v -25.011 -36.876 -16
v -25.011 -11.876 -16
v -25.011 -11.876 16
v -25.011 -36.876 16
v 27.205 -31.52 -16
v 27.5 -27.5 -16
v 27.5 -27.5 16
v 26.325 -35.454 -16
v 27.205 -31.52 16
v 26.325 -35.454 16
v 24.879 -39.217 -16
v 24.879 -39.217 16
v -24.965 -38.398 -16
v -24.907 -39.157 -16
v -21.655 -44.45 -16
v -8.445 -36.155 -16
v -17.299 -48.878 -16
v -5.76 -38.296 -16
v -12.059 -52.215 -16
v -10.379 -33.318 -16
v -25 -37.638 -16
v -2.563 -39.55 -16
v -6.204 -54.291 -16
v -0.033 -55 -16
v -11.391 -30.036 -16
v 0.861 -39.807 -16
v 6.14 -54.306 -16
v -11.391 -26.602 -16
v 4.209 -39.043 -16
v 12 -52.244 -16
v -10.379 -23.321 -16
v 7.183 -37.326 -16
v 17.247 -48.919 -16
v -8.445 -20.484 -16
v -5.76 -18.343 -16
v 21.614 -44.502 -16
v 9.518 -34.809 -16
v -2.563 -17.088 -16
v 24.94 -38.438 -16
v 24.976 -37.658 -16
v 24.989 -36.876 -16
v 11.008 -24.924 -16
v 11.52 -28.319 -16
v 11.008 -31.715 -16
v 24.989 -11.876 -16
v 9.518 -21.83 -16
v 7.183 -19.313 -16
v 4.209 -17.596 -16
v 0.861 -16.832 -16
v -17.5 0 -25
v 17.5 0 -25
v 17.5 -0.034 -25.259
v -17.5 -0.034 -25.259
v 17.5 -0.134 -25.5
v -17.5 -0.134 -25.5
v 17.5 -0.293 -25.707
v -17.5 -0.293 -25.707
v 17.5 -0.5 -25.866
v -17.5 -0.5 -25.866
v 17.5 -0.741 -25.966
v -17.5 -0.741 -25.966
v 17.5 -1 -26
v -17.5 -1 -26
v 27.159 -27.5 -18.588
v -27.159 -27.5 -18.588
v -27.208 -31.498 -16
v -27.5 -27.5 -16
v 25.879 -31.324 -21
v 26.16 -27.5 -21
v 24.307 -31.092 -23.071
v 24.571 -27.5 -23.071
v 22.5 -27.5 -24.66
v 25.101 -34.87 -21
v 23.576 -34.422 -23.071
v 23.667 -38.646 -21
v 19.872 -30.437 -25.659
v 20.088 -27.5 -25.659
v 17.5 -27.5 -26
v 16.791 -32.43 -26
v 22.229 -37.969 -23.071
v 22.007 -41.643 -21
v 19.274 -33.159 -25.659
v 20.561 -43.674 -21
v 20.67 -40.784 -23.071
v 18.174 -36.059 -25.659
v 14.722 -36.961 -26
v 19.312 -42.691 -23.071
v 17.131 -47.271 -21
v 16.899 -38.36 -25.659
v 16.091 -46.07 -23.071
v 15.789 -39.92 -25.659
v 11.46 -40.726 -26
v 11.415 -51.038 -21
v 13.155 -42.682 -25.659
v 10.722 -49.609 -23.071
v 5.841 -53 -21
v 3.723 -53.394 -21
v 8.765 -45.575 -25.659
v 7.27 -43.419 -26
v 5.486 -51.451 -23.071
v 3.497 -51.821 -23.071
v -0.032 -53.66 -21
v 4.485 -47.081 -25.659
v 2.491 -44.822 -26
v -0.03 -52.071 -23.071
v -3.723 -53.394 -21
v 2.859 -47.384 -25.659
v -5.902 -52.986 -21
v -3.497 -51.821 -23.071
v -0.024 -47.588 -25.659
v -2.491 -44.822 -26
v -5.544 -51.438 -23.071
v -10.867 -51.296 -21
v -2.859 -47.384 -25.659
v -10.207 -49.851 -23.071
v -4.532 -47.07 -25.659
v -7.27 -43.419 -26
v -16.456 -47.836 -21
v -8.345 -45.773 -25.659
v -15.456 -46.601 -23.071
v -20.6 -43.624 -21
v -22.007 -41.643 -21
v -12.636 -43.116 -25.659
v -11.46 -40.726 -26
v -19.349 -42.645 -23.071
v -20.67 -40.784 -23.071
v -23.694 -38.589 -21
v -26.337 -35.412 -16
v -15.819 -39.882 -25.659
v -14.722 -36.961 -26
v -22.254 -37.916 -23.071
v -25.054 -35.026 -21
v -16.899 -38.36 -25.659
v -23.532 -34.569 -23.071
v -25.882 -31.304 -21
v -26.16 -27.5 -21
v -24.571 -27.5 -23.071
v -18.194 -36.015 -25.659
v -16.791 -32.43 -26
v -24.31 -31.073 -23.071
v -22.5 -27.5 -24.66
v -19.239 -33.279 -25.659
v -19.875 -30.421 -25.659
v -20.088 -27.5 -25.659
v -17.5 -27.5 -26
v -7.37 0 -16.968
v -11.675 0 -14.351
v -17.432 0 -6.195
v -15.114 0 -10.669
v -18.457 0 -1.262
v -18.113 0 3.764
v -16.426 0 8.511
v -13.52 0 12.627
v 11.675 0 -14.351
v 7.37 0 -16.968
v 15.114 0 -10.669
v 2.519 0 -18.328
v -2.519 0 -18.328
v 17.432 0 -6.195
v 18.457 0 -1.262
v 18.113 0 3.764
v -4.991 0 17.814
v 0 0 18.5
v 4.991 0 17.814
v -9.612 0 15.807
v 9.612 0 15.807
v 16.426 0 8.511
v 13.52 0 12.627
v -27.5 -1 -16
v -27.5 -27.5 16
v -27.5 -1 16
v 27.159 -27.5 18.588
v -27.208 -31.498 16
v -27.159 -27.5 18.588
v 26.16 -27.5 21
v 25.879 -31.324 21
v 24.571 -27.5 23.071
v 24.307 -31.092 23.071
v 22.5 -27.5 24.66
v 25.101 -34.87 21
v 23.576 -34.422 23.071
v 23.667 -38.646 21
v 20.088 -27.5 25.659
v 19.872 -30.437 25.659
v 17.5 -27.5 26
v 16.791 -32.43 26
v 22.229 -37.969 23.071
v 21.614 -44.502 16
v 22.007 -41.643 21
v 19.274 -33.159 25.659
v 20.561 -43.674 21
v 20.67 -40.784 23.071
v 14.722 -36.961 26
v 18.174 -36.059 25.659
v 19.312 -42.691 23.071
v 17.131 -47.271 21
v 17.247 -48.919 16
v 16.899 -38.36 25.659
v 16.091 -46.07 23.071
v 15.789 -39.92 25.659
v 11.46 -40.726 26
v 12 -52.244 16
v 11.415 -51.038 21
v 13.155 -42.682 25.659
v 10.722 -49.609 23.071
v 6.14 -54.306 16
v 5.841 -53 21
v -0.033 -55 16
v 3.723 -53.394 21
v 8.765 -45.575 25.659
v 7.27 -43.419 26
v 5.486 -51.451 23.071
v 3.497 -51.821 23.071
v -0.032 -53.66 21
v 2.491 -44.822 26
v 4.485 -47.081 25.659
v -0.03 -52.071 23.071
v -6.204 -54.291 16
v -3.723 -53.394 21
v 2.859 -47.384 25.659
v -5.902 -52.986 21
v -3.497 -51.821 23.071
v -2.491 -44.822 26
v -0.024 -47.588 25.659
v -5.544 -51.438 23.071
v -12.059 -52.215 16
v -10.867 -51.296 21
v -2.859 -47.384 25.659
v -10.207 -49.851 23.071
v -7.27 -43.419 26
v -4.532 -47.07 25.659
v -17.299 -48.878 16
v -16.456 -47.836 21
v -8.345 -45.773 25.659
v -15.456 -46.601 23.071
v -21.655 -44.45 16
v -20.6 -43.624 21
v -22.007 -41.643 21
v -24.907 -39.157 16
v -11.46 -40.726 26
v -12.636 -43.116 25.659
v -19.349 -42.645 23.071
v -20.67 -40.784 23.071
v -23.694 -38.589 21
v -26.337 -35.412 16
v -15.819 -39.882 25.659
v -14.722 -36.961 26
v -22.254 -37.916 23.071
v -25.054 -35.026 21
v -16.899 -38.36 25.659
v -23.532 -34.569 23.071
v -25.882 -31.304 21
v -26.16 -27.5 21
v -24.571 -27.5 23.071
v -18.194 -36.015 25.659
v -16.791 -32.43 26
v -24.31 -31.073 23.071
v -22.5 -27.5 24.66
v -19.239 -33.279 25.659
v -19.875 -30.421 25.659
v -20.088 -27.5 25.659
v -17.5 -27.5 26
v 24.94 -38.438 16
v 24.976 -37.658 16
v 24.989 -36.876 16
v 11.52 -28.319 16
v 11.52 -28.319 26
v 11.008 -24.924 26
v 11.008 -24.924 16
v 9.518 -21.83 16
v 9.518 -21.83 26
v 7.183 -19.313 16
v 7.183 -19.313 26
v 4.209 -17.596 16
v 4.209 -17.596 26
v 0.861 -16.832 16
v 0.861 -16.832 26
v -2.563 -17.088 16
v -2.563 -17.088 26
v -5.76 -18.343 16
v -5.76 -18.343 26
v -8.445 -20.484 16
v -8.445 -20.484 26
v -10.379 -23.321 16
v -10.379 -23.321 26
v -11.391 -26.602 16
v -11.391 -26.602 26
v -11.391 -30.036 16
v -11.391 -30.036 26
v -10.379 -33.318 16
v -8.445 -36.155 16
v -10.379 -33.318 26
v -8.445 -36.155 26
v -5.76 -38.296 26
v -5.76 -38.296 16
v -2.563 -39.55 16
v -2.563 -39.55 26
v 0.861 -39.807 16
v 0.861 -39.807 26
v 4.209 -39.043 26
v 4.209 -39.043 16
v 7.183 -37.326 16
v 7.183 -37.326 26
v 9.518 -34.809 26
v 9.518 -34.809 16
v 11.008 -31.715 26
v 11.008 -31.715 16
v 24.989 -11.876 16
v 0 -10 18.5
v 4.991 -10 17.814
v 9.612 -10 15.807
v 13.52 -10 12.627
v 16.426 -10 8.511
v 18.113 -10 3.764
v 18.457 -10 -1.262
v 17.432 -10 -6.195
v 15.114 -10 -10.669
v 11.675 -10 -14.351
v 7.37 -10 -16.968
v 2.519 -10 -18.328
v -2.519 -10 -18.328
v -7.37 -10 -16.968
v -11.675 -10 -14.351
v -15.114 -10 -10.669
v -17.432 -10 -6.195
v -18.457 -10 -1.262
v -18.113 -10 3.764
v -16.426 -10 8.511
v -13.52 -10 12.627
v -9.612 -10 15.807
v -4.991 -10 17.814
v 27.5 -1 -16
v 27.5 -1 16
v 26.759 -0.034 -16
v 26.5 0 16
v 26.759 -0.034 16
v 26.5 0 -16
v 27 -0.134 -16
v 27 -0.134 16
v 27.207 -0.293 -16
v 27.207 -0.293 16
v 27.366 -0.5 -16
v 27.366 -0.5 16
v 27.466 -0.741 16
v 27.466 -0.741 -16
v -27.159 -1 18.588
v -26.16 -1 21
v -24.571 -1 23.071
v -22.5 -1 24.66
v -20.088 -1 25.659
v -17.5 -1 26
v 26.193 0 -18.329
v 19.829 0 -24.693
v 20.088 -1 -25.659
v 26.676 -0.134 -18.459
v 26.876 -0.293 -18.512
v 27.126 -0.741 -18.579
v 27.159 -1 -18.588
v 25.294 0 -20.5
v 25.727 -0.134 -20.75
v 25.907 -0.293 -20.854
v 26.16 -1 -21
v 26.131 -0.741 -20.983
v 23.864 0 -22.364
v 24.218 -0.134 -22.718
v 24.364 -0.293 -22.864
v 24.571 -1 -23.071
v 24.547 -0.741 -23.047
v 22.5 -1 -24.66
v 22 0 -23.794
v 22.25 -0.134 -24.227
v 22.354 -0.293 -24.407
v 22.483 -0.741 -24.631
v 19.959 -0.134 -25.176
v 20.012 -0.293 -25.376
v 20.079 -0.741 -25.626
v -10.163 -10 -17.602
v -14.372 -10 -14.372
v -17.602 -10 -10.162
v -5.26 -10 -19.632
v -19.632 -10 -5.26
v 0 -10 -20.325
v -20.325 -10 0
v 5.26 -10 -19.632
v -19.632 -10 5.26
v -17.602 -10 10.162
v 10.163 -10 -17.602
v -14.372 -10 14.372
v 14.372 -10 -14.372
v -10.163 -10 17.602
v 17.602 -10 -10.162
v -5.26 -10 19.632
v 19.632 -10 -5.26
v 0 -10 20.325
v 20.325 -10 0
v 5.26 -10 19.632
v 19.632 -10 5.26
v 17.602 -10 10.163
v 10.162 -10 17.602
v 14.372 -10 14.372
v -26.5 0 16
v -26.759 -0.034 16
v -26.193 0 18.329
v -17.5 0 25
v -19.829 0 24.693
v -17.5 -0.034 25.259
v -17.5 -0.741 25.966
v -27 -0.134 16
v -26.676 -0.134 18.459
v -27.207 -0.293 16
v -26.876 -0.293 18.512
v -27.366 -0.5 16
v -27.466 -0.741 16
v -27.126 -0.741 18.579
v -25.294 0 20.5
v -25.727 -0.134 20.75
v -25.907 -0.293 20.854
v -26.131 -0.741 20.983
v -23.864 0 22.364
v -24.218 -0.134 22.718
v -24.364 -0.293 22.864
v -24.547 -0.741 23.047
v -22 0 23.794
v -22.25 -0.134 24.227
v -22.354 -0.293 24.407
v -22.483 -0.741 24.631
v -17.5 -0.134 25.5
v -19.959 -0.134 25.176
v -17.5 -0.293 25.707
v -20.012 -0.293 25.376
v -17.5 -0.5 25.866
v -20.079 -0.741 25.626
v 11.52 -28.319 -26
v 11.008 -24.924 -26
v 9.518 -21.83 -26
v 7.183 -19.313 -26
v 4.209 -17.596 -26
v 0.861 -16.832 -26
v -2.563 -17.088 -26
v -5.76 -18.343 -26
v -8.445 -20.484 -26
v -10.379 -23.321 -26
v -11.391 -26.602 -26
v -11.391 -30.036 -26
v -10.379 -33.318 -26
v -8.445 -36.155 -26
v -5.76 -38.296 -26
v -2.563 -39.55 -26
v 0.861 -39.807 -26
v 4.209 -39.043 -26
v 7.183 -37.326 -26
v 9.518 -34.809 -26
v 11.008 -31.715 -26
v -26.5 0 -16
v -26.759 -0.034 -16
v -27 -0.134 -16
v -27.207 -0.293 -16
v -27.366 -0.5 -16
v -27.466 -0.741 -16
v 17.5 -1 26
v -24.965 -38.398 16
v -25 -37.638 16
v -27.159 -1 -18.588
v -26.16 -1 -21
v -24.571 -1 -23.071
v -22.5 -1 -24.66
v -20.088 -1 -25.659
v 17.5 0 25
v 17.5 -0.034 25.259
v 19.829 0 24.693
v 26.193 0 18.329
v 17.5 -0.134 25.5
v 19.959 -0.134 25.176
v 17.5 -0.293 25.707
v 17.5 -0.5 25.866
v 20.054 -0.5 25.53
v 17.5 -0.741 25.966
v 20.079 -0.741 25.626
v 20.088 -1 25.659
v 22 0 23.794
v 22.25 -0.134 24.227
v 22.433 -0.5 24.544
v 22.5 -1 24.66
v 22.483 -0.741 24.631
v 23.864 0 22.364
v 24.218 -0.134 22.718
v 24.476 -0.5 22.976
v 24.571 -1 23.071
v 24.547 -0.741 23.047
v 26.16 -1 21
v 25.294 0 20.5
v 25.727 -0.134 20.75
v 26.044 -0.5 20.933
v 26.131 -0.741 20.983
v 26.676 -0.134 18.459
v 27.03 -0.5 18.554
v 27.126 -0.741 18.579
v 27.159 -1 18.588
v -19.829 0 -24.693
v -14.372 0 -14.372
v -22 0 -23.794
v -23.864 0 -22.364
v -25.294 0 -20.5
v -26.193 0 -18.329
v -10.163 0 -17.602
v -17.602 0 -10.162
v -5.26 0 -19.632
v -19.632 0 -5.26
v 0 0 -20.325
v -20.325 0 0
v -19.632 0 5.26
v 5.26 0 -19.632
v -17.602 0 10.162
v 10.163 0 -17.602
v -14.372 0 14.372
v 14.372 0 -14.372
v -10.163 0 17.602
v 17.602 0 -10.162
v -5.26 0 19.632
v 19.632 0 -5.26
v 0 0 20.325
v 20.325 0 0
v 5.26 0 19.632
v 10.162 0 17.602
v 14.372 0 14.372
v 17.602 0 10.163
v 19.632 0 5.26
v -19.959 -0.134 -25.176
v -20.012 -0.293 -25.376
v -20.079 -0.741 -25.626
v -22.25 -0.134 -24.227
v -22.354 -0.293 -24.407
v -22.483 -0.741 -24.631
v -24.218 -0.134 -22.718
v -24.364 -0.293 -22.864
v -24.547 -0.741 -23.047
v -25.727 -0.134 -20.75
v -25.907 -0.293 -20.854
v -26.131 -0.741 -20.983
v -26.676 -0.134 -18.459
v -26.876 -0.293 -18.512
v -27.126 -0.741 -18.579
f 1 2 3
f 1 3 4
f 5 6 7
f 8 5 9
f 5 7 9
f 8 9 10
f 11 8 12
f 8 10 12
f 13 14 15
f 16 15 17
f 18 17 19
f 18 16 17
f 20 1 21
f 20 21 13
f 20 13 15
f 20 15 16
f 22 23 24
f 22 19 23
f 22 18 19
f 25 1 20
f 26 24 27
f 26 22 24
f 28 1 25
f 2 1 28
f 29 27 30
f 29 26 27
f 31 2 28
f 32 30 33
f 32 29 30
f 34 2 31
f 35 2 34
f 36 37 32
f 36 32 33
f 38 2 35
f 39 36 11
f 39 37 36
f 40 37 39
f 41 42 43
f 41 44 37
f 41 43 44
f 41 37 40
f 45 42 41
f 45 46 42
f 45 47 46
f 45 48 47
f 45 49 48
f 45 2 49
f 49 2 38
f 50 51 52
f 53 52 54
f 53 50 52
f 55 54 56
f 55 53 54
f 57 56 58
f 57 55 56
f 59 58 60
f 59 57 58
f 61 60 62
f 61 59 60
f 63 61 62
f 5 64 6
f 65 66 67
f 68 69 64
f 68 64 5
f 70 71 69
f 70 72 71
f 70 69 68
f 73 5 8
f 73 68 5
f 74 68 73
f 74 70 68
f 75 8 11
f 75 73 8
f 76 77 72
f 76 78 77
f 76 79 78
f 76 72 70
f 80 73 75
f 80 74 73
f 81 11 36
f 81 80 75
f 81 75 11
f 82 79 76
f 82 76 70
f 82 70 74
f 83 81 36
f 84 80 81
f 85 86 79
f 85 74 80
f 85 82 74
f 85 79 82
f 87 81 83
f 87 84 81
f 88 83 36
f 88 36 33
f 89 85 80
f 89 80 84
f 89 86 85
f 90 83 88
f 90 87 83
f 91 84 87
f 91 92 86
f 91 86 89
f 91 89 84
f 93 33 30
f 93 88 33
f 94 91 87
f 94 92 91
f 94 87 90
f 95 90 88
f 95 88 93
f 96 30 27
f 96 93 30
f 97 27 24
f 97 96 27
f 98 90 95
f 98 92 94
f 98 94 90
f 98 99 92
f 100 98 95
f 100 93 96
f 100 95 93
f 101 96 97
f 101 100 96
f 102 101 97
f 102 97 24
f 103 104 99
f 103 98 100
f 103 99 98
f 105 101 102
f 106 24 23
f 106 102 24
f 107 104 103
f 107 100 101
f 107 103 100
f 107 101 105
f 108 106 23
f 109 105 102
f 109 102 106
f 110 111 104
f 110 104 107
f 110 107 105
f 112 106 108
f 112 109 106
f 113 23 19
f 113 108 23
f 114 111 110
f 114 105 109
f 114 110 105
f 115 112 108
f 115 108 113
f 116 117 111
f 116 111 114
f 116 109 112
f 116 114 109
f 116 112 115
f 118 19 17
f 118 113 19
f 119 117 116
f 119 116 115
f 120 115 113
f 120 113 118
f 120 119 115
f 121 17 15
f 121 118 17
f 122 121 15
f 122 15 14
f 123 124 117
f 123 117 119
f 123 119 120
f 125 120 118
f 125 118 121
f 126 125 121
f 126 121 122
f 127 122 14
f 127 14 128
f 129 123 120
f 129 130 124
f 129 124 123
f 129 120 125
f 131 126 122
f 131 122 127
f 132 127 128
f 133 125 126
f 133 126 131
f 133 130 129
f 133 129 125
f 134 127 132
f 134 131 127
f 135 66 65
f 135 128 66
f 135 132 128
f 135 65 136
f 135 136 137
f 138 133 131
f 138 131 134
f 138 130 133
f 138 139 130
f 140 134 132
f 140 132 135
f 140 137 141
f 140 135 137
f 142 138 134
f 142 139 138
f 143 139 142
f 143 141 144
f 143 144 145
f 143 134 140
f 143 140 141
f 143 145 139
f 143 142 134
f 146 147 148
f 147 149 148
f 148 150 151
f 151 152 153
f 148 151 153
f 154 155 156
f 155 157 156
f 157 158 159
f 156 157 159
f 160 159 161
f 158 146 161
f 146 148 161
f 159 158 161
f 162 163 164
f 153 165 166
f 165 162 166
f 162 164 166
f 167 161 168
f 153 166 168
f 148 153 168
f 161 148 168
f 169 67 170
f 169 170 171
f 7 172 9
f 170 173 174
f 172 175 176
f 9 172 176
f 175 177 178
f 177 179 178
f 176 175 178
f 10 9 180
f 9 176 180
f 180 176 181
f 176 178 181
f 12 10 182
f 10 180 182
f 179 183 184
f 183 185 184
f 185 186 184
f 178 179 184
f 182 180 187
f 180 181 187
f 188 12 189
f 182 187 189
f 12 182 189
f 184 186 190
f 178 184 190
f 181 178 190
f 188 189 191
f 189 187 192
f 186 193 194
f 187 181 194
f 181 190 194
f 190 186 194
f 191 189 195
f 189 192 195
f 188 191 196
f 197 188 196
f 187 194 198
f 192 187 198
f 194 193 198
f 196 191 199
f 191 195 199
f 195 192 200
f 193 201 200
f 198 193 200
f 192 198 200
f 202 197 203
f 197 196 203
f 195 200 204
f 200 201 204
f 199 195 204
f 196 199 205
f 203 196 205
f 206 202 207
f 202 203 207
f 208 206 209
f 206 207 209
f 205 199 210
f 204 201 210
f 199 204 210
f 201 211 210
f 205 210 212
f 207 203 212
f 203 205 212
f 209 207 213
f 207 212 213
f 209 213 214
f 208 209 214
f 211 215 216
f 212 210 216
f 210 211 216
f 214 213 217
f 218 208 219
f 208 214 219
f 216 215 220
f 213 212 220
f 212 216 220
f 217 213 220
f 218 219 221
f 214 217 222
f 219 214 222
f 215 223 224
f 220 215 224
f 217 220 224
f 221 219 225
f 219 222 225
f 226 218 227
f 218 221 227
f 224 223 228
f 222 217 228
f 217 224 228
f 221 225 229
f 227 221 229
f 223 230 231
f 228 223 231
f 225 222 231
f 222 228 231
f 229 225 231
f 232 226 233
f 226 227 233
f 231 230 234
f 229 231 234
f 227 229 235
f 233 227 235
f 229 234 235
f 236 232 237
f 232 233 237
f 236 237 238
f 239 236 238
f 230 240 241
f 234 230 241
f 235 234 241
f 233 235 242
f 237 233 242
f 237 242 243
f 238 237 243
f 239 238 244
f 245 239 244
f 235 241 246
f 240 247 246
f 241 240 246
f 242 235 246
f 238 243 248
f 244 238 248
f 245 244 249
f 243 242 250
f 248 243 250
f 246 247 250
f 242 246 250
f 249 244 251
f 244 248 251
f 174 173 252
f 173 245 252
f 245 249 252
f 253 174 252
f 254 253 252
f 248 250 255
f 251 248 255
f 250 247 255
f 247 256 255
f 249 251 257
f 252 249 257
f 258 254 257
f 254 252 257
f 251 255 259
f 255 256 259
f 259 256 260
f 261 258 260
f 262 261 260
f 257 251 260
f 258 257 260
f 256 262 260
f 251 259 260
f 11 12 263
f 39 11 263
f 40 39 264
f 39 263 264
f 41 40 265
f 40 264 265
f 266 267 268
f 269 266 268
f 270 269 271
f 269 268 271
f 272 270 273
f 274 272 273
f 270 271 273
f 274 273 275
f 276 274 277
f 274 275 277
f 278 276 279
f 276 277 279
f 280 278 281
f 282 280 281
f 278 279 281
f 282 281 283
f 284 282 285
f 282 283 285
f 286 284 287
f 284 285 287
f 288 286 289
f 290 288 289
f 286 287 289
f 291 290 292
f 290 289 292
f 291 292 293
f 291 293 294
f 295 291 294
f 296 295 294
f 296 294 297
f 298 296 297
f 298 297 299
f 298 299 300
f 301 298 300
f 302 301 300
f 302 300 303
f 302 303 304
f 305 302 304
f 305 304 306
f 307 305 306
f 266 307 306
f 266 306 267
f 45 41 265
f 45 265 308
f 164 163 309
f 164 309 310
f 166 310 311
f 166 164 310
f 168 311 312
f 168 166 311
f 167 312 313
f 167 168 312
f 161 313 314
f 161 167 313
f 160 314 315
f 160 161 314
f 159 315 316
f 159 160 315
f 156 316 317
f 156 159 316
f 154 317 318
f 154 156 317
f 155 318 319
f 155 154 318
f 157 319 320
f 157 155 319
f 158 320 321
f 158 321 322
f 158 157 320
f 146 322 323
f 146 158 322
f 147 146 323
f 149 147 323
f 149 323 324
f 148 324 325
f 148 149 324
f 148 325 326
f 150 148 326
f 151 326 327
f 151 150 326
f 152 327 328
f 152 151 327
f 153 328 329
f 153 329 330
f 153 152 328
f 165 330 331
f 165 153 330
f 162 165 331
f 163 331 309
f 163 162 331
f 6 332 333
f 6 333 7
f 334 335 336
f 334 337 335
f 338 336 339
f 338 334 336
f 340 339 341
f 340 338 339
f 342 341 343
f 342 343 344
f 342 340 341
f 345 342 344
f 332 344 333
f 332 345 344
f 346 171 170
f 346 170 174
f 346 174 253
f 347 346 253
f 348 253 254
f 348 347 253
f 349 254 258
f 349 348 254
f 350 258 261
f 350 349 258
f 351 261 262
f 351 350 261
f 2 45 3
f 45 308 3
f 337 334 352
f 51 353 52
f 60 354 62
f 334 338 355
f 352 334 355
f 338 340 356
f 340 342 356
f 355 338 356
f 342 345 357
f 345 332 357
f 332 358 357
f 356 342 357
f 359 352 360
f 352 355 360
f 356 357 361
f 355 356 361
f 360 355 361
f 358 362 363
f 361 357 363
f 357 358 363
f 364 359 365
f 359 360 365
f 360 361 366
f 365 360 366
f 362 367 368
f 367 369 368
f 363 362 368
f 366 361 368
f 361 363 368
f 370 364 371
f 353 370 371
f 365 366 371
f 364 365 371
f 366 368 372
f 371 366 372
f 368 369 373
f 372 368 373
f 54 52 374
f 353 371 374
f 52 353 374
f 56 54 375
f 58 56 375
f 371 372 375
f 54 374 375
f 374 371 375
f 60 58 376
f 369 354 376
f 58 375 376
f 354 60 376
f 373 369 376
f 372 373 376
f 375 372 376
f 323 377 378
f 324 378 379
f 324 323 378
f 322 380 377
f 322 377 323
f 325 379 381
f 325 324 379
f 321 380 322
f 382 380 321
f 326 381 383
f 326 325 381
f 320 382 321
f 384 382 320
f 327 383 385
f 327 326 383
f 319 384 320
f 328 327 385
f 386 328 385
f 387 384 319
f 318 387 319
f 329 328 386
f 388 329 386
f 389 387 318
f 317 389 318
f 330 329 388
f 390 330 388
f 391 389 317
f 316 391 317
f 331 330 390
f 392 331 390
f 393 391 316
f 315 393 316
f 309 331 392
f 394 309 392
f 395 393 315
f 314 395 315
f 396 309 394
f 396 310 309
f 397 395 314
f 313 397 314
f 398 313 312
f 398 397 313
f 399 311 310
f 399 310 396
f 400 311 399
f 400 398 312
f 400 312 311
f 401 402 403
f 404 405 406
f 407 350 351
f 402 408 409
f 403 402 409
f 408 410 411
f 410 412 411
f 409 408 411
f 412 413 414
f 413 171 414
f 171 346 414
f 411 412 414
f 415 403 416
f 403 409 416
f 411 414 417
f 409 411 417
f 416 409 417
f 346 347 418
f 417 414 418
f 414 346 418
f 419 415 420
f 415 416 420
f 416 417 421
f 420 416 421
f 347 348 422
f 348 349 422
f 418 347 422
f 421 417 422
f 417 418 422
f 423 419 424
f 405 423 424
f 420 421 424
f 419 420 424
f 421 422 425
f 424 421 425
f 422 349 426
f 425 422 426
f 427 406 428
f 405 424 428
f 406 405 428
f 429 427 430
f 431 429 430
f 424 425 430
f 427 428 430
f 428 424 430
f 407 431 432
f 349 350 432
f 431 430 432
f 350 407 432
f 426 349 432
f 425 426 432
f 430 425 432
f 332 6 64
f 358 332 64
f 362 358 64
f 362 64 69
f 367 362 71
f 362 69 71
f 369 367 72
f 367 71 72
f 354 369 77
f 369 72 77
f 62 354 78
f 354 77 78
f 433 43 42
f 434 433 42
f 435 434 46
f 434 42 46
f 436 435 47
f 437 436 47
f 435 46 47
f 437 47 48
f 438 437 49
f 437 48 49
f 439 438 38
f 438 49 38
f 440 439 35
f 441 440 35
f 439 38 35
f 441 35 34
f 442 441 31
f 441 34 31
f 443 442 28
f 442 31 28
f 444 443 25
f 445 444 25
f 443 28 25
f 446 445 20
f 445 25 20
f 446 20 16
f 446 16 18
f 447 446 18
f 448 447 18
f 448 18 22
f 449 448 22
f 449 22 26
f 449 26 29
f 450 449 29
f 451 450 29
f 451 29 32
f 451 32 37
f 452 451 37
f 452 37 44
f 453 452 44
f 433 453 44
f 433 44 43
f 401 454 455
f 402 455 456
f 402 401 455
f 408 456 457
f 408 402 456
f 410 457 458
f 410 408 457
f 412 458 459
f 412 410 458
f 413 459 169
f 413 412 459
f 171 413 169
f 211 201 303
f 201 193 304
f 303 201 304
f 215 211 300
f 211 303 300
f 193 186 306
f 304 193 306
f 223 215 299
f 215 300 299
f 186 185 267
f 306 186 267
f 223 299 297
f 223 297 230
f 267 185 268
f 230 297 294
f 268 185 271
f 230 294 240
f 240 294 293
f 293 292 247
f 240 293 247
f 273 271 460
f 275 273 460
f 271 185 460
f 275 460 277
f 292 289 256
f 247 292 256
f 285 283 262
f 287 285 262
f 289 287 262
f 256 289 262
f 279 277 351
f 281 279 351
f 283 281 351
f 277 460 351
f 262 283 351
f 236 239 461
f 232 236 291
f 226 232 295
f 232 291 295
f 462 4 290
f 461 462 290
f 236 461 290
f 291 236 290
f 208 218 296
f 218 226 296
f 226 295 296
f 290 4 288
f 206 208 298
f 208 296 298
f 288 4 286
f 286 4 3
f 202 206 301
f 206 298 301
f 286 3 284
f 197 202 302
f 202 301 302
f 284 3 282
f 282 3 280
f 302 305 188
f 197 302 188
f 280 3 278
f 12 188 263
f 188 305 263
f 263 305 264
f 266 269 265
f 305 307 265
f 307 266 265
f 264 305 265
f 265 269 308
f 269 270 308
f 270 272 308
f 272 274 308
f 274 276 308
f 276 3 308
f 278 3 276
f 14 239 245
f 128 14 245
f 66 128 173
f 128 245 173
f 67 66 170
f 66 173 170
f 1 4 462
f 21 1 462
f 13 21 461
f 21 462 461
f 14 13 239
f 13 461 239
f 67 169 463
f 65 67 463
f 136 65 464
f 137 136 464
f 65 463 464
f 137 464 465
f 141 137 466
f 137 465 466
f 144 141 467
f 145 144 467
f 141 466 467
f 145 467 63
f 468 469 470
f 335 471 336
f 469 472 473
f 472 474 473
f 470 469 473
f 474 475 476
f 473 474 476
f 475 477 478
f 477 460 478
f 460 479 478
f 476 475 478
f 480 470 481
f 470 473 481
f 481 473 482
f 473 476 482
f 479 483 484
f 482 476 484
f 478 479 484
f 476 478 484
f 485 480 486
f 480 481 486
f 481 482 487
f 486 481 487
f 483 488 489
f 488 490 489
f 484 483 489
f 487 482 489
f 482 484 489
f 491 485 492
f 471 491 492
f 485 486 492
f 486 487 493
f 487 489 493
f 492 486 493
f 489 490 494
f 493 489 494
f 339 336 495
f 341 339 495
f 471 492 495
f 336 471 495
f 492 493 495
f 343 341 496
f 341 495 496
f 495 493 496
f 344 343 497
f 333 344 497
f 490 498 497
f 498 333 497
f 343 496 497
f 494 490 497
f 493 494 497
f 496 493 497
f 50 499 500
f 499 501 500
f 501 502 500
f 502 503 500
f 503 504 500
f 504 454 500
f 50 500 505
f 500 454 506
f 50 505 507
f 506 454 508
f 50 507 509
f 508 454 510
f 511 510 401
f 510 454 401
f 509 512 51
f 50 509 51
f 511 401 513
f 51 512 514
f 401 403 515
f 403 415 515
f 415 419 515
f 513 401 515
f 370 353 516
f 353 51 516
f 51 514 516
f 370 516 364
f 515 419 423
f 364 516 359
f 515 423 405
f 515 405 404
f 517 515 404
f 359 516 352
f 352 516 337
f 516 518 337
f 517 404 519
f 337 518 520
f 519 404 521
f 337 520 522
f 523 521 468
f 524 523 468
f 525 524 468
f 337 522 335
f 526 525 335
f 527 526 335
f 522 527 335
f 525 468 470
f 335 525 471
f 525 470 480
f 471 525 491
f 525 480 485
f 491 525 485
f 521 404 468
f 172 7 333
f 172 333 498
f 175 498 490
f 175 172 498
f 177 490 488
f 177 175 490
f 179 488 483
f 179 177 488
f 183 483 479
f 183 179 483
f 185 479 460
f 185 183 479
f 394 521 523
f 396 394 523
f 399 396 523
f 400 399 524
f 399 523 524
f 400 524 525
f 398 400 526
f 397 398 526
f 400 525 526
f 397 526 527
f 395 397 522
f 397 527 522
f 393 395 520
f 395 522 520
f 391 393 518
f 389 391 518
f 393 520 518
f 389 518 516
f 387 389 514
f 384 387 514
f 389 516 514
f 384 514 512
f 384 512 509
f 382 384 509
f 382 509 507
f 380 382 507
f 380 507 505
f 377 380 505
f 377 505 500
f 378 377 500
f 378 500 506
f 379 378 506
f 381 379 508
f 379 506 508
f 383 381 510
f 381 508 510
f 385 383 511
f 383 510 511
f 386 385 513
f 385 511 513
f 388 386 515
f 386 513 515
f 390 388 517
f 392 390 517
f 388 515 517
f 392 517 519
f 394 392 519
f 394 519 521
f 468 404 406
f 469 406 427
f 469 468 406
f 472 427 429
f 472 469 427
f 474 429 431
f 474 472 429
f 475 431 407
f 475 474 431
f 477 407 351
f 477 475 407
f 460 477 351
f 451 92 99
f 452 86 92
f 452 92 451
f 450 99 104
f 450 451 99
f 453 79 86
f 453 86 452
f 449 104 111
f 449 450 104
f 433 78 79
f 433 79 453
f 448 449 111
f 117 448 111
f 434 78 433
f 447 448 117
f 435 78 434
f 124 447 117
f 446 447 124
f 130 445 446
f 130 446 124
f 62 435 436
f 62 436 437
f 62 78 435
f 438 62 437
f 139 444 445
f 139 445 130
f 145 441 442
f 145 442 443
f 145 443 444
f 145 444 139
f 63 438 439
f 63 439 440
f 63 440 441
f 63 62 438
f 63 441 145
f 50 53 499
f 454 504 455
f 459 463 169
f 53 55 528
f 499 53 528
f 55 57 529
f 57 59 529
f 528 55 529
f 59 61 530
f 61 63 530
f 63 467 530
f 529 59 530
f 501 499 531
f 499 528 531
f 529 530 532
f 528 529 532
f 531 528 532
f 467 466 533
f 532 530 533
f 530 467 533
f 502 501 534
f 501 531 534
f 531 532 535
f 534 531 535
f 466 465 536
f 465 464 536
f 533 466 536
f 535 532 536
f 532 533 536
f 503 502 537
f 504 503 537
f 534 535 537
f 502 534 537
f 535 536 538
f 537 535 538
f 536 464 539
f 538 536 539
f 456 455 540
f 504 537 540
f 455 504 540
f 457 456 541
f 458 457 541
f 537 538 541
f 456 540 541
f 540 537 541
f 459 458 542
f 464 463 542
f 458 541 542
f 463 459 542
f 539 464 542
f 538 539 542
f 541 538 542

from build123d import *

# Parameters (mm, degrees)
BOSS_EXTRUDE1_DEPTH = 26
SKETCH3_R           = 20.325
SKETCH3_R_2         = 18.5
CUT_EXTRUDE1_DEPTH  = 10
FILLET1_R           = 10
FILLET5_R           = 1
CUT_EXTRUDE2_DEPTH  = 16
SKETCH10_R          = 11.52
CUT_EXTRUDE4_DEPTH  = 75


with BuildPart() as part:
    # Sketch2 → Boss-Extrude1 (new, symmetric)
    with BuildSketch(Plane.XY):
        with BuildLine():
            Line((-27.5, -27.5), (-27.5, 0))
            Line((-27.5, 0), (27.5, 0))
            Line((27.5, 0), (27.5, -27.5))
            ThreePointArc((27.5, -27.5), (0, -55), (-27.5, -27.5))
        make_face()
    extrude(amount=BOSS_EXTRUDE1_DEPTH, both=True)

    # Sketch3 → Cut-Extrude1 (cut)
    with BuildSketch(Plane(origin=(0, 0, 0), x_dir=(1, 0, 0), z_dir=(0, 1, 0))):
        with Locations(Location((0, 0, 0), (0, 0, 270))):
            Circle(SKETCH3_R)
        with Locations(Location((0, 0, 0), (0, 0, 270))):
            Circle(SKETCH3_R_2, mode=Mode.SUBTRACT)
    extrude(amount=-CUT_EXTRUDE1_DEPTH, mode=Mode.SUBTRACT)

    # Fillet1
    fillet1_edges = [part.edges().sort_by_distance(p)[0] for p in [
        (-27.5, -13.75, 26),
        (0, -55, 26),
        (-27.5, -13.75, -26),
        (27.5, -13.75, -26),
        (0, -55, -26),
        (27.5, -13.75, 26),
    ]]
    fillet(fillet1_edges, radius=FILLET1_R)

    # Fillet5
    fillet5_edges = [part.edges().sort_by_distance(p)[0] for p in [
        (27.5, 0, 0),
        (0, 0, -26),
        (-27.5, 0, 0),
        (0, 0, 26),
        (-24.571067812, 0, 23.071067812),
        (-24.571067812, 0, -23.071067812),
        (24.571067812, 0, 23.071067812),
        (24.571067812, 0, -23.071067812),
    ]]
    fillet(fillet5_edges, radius=FILLET5_R)

    # Sketch7 → Cut-Extrude2 (cut, symmetric)
    with BuildSketch(Plane.XY):
        with BuildLine():
            Line((-0.011296589, -11.876404256), (-25.011296589, -11.876404256))
            Line((-25.011296589, -11.876404256), (-25.011296589, -36.876404256))
            ThreePointArc((-25.011296589, -36.876404256), (-0.011296589, -61.876404256), (24.988703411, -36.876404256))
            Line((24.988703411, -36.876404256), (24.988703411, -11.876404256))
            Line((24.988703411, -11.876404256), (-0.011296589, -11.876404256))
        make_face()
    extrude(amount=CUT_EXTRUDE2_DEPTH, both=True, mode=Mode.SUBTRACT)

    # Sketch10 → Cut-Extrude4 (cut)
    with BuildSketch(Plane.XY.offset(26)):
        with Locations((0, -28.319318025)):
            Circle(SKETCH10_R)
    extrude(amount=-CUT_EXTRUDE4_DEPTH, mode=Mode.SUBTRACT)


solid = part.part
